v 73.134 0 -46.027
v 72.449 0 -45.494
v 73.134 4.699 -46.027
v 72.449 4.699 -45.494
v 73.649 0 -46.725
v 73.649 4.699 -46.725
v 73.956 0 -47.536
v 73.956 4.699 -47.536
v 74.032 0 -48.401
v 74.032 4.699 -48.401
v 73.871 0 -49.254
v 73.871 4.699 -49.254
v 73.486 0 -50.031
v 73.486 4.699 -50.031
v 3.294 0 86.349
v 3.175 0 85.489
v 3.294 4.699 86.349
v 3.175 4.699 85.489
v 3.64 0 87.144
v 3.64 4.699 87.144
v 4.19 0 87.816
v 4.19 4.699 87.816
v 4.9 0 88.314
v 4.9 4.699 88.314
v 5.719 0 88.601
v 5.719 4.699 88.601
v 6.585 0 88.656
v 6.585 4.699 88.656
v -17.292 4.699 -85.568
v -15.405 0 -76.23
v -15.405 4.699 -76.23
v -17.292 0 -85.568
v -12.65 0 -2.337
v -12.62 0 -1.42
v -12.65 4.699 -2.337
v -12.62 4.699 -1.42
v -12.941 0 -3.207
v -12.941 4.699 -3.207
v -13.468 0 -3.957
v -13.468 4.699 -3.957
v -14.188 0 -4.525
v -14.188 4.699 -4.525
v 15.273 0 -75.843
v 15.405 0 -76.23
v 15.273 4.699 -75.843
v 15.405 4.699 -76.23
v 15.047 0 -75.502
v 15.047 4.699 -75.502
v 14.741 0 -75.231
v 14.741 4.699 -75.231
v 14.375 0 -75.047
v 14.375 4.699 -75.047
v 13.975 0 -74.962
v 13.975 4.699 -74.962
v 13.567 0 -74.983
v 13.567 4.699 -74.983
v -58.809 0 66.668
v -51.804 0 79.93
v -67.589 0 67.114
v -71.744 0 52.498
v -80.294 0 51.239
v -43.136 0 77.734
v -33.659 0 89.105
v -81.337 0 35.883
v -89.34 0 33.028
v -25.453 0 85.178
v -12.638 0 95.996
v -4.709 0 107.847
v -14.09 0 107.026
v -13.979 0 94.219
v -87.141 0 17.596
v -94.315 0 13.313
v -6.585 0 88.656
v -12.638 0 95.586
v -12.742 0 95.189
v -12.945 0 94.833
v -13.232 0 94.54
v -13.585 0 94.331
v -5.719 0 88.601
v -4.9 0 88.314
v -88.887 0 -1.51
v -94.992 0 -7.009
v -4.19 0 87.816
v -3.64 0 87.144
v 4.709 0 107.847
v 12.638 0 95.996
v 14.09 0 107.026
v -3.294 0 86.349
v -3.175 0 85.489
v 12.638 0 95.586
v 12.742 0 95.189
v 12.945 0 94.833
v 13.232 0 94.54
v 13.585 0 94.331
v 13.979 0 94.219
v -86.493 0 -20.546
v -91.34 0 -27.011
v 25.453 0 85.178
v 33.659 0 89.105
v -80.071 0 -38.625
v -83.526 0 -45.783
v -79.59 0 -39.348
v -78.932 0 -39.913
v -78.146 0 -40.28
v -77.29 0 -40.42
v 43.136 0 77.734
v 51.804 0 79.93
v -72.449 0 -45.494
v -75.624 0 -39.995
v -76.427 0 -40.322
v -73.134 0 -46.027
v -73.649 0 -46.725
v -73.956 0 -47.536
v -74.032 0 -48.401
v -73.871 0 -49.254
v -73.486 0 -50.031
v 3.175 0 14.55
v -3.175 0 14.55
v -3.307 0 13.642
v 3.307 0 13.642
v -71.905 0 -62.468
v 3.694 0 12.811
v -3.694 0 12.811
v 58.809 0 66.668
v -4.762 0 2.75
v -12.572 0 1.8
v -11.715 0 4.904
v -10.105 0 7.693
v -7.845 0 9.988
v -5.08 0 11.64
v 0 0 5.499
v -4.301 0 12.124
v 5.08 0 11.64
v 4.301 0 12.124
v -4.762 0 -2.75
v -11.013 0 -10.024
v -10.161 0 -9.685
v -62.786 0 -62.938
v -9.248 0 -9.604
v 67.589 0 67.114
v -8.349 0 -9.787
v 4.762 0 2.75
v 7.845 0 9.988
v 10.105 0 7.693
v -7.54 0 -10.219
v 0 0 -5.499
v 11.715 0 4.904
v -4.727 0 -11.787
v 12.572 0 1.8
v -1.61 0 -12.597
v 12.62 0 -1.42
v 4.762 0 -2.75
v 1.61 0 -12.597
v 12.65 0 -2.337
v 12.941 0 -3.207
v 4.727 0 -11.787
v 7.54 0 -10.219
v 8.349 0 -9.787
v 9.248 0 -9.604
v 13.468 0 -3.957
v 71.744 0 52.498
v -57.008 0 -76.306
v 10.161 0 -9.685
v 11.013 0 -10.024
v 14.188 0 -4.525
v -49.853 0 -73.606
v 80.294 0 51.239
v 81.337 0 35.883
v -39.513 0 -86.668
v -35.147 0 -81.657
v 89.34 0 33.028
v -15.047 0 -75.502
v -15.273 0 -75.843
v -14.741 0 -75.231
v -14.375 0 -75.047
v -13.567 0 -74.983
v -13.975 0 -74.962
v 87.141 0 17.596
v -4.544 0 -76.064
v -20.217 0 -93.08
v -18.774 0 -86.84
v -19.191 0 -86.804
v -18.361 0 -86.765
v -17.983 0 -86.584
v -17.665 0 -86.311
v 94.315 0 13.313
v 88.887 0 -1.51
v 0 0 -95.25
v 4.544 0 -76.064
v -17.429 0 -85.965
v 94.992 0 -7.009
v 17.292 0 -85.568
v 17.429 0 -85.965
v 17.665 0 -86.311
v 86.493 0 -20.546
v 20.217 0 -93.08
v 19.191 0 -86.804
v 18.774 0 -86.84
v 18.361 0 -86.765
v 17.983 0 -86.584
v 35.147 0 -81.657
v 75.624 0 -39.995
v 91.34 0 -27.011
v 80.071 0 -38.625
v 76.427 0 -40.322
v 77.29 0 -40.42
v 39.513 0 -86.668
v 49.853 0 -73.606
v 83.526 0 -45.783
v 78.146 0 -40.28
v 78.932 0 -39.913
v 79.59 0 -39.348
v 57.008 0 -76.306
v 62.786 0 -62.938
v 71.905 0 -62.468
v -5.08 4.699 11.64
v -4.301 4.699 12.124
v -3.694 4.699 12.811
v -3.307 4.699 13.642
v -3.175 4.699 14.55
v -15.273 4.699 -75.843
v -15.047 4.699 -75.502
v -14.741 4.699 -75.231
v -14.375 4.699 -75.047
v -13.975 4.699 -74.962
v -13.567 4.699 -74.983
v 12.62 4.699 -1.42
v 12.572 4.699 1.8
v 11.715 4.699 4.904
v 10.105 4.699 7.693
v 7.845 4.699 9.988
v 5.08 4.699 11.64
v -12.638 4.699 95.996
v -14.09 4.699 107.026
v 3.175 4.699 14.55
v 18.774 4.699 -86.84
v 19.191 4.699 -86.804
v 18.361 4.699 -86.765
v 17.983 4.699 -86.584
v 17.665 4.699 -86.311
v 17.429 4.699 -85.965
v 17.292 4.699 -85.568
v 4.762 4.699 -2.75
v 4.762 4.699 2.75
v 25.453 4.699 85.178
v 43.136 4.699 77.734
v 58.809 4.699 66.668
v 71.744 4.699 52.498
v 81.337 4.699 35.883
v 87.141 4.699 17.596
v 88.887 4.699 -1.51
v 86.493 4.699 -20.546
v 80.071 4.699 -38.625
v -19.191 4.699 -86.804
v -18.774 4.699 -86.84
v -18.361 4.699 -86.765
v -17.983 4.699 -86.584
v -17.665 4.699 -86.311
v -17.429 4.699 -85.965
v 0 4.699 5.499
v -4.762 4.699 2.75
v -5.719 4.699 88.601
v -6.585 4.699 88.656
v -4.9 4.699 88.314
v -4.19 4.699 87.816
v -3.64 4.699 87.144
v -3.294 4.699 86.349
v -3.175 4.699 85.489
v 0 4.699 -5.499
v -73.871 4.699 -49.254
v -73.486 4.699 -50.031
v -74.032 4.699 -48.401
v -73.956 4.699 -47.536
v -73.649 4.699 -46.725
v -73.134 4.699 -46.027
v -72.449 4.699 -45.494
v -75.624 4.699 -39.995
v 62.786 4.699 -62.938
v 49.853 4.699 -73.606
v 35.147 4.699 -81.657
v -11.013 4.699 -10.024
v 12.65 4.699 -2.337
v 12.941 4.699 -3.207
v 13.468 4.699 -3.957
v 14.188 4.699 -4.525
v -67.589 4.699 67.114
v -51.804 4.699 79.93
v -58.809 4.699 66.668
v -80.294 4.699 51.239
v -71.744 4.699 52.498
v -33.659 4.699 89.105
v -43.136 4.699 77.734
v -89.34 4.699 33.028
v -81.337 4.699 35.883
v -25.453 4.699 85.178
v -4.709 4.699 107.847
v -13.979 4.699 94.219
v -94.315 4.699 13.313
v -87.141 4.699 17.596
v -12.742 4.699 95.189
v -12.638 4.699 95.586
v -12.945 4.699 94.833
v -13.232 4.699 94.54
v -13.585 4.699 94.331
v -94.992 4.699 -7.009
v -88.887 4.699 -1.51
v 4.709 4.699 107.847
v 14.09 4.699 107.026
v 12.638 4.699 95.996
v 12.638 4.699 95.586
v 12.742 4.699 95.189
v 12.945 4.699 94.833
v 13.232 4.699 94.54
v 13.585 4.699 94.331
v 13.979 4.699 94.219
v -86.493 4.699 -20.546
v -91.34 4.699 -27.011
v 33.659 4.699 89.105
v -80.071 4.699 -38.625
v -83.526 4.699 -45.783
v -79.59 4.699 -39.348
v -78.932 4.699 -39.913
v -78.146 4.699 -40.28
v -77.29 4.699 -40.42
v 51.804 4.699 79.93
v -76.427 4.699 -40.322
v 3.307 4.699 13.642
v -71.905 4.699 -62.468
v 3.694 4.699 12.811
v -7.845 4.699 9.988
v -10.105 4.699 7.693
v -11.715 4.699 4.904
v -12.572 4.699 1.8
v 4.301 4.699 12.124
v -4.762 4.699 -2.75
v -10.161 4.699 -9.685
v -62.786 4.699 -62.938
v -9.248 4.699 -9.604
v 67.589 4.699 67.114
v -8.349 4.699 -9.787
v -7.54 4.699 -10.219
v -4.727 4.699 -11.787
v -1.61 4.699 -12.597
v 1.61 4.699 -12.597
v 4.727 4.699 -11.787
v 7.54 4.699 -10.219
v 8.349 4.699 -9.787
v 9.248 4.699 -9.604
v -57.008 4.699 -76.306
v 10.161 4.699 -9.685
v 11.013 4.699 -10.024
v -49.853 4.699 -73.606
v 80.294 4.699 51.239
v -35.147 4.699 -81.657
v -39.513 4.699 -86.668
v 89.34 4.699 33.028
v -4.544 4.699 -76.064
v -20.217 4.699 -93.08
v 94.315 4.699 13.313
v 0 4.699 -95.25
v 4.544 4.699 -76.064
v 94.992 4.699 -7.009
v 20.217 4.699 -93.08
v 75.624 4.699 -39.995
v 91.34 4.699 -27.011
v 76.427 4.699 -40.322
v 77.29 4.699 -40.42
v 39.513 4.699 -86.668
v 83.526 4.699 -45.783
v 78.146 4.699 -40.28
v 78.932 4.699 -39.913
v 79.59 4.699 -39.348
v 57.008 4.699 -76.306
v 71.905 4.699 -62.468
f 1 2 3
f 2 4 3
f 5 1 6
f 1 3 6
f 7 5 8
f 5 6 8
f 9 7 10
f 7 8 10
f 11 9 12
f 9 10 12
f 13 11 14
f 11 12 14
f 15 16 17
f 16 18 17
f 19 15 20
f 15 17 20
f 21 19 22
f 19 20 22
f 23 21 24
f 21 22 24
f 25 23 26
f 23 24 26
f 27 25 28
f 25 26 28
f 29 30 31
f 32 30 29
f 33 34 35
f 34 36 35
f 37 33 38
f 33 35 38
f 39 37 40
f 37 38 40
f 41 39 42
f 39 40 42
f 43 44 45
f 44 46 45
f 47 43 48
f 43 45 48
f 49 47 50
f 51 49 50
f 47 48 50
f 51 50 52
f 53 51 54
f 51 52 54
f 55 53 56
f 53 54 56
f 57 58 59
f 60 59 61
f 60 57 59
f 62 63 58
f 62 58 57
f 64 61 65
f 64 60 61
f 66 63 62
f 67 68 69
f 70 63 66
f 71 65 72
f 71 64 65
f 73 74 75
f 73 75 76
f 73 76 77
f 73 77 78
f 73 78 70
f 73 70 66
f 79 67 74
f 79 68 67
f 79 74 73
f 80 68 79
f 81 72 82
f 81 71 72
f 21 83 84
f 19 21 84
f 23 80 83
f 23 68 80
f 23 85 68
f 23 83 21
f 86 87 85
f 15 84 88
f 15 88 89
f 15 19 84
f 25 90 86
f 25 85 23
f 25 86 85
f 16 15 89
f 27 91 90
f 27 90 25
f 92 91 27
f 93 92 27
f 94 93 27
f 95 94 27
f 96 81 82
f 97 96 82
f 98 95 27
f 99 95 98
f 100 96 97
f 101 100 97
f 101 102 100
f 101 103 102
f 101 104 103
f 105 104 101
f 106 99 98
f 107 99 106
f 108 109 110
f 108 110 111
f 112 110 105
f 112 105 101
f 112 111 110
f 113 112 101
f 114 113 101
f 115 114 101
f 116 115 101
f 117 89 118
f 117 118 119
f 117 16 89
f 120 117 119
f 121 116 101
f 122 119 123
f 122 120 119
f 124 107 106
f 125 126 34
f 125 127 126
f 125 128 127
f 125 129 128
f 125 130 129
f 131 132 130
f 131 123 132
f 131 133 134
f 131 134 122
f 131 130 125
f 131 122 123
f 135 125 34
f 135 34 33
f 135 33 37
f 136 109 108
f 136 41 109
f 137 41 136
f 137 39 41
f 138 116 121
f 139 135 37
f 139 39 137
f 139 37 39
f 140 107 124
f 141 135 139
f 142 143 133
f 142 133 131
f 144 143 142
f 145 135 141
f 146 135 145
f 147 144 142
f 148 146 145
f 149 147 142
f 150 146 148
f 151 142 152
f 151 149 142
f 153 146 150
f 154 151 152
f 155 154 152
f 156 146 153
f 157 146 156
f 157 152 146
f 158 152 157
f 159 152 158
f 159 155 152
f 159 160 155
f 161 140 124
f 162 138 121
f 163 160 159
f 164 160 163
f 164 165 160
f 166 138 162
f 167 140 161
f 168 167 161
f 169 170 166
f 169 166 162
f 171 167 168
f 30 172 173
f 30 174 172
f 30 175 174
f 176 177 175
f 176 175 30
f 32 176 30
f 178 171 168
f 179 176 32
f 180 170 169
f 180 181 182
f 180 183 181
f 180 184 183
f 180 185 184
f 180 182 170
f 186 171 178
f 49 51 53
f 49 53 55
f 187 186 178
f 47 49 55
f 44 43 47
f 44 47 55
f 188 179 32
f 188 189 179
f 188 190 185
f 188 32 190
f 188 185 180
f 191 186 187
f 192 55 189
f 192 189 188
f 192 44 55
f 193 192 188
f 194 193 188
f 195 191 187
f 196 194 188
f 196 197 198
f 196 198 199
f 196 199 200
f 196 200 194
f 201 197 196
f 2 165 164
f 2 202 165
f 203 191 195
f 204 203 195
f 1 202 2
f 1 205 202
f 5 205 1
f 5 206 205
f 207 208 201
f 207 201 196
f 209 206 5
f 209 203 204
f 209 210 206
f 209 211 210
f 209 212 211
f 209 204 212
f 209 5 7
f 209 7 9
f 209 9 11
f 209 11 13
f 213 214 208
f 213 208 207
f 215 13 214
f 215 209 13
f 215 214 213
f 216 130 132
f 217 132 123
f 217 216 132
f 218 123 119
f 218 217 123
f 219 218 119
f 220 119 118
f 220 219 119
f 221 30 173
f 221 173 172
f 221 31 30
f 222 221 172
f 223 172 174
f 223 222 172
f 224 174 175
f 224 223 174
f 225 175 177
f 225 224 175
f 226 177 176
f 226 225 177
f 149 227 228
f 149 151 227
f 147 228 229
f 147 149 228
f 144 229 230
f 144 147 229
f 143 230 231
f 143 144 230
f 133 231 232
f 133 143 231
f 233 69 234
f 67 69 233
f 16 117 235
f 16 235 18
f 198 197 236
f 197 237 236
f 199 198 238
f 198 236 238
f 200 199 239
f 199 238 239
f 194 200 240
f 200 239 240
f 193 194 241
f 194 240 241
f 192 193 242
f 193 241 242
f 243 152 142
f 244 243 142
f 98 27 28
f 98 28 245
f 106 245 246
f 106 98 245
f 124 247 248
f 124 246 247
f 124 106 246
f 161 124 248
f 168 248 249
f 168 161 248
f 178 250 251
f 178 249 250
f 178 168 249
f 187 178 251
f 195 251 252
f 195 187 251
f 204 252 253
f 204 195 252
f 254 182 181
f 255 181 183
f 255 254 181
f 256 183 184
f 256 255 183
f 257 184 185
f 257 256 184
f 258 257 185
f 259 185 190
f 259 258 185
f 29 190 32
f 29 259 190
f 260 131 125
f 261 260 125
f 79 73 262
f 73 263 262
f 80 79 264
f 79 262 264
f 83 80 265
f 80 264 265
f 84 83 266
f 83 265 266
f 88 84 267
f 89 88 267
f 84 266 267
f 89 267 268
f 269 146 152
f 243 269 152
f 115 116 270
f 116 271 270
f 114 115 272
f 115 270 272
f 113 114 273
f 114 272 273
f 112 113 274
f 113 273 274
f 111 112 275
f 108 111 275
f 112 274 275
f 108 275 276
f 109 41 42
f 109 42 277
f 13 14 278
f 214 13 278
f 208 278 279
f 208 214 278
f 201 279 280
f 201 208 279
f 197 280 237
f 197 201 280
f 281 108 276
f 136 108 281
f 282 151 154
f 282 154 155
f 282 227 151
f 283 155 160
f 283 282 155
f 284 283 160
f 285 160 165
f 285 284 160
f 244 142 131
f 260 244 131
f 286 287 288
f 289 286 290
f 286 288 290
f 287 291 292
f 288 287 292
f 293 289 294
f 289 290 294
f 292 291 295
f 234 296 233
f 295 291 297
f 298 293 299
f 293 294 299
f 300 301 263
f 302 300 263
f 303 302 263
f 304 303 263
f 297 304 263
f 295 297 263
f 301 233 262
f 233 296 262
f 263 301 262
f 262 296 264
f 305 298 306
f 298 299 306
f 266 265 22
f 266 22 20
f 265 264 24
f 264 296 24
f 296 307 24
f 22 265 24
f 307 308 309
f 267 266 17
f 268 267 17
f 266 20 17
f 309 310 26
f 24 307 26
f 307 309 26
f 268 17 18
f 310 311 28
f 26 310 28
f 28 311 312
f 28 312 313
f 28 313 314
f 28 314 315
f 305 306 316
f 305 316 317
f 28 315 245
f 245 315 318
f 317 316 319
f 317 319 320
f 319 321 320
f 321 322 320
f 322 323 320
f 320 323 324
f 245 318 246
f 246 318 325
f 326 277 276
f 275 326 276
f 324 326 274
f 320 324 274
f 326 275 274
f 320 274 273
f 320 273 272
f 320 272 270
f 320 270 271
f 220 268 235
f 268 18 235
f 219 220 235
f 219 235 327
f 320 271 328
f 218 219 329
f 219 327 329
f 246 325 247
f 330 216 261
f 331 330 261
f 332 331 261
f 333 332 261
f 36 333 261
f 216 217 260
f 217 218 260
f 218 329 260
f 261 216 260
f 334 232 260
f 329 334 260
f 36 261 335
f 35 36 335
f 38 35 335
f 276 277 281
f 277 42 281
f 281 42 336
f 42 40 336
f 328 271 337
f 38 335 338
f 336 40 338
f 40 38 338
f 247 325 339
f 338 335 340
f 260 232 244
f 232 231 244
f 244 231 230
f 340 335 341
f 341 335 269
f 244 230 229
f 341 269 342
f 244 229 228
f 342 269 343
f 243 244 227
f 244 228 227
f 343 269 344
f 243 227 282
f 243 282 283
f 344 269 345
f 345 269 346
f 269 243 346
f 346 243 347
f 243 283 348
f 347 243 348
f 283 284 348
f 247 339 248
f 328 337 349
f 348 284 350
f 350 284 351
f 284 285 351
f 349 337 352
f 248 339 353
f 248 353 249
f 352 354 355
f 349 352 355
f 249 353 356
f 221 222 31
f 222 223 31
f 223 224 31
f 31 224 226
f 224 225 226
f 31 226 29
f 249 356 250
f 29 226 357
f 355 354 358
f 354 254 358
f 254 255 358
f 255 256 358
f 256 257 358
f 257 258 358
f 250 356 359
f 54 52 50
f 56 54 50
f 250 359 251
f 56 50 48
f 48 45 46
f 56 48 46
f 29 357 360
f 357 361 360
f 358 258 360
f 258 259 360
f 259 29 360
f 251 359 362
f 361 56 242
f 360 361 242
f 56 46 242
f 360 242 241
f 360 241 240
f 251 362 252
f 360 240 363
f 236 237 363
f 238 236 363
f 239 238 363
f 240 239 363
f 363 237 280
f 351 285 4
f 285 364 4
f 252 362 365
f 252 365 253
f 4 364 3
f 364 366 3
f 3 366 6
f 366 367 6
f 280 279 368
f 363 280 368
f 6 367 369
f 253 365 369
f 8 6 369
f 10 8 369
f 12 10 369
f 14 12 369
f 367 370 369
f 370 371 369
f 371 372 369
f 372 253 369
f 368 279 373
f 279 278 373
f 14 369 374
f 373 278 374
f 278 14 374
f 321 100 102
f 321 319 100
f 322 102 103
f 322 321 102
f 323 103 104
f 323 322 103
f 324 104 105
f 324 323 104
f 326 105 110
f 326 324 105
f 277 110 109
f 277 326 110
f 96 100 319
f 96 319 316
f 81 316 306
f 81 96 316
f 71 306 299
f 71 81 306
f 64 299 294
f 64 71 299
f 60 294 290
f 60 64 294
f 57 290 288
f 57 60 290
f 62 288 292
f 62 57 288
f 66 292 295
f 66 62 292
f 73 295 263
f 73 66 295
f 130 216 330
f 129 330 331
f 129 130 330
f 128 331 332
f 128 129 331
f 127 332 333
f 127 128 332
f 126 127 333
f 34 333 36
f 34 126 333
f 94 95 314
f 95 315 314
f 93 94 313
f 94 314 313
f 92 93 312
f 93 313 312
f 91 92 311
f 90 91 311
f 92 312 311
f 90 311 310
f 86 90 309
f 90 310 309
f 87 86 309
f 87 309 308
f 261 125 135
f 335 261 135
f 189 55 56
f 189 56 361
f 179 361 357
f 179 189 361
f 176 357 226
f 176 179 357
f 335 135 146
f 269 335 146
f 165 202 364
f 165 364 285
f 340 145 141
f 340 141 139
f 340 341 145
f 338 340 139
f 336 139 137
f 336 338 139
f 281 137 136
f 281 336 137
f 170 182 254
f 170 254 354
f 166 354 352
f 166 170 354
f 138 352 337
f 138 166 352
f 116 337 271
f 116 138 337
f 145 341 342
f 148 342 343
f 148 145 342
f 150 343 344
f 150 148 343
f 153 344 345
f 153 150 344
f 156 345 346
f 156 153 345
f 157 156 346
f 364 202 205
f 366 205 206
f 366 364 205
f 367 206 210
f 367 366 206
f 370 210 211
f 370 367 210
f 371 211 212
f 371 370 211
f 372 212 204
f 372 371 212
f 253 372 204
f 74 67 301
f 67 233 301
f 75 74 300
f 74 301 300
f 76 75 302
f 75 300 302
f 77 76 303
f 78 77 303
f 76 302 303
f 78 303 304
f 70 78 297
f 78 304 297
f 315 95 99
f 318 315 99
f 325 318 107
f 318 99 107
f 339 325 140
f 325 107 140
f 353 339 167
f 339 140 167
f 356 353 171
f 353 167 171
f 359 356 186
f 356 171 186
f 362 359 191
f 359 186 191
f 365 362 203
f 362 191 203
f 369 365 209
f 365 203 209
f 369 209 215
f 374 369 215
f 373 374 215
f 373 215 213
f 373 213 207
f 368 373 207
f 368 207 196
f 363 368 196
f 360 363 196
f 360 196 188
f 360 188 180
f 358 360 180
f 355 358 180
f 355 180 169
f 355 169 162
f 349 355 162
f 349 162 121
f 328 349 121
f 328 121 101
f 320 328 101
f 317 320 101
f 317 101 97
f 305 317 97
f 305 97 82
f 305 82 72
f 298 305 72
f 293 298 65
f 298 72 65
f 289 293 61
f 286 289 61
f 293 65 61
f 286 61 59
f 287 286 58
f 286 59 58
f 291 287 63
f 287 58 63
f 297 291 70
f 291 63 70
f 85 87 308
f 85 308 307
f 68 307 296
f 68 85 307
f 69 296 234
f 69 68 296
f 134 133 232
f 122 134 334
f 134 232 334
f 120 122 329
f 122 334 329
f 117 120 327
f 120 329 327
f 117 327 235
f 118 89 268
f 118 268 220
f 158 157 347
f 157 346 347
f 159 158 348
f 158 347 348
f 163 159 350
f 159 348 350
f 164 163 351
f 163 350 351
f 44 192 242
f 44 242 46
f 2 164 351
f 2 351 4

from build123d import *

# Parameters (mm, degrees)
SKETCH1_R                = 95.25
SKETCH1_R_2              = 88.9
BOSS_EXTRUDE1_DEPTH      = 4.699
BOSS_EXTRUDE2_DEPTH      = 4.699
SKETCH3_R                = 12.7
BOSS_EXTRUDE3_DEPTH      = 4.699
BOSS_EXTRUDE4_DEPTH      = 4.699
FILLET1_R                = 3.175
CIRPATTERN1_COUNT        = 3
FILLET1_OF_CIRPATTERN1_R = 3.175
FILLET2_R                = 1.5875


with BuildPart() as part:
    # Sketch1 → Boss-Extrude1 (new body)
    with BuildSketch(Plane(origin=(0, 0, 0), x_dir=(1, 0, 0), z_dir=(0, 1, 0))):
        with Locations(Location((0, 0, 0), (0, 0, 270))):
            Circle(SKETCH1_R)
        with Locations(Location((0, 0, 0), (0, 0, 270))):
            Circle(SKETCH1_R_2, mode=Mode.SUBTRACT)
    extrude(amount=BOSS_EXTRUDE1_DEPTH)

    # Sketch2 → Boss-Extrude2 (add)
    with BuildSketch(Plane.XZ):
        with BuildLine():
            ThreePointArc((14.09030245, 107.026472785), (0, 107.95), (-14.09030245, 107.026472785))
            Line((-14.09030245, 107.026472785), (-12.432619809, 94.435123046))
            ThreePointArc((-12.432619809, 94.435123046), (0, 95.25), (12.432619809, 94.435123046))
            Line((12.432619809, 94.435123046), (14.09030245, 107.026472785))
        make_face()
        with BuildLine():
            Line((-15.09408047, -74.690084581), (-17.609760548, -87.138432012))
            ThreePointArc((-17.609760548, -87.138432012), (0, -88.9), (17.609760548, -87.138432012))
            Line((17.609760548, -87.138432012), (15.09408047, -74.690084581))
            ThreePointArc((15.09408047, -74.690084581), (0, -76.2), (-15.09408047, -74.690084581))
        make_face()
    extrude(amount=-BOSS_EXTRUDE2_DEPTH)



with BuildPart() as body_2:
    # Sketch3 → Boss-Extrude3 (new body)
    with BuildSketch(Plane.XZ):
        with Locations(Location((0, 0, 0), (0, 0, 270))):
            Circle(SKETCH3_R)
        Polygon((0, 5.499261314), (-4.7625, 2.749630657), (-4.7625, -2.749630657), (0, -5.499261314), (4.7625, -2.749630657), (4.7625, 2.749630657), align=None, mode=Mode.SUBTRACT)
    extrude(amount=-BOSS_EXTRUDE3_DEPTH)


with BuildPart() as part_1:
    add(part.part)

    add(body_2.part)  # Boss-Extrude4 merges body 2
    # Sketch4 → Boss-Extrude4 (add)
    with BuildSketch(Plane(origin=(0, 0, 0), x_dir=(-1, 0, 0), z_dir=(0, -1, 0))):
        with BuildLine():
            Line((3.175, -88.843285481), (3.175, -12.296722124))
            ThreePointArc((3.175, -12.296722124), (0, -12.7), (-3.175, -12.296722124))
            Line((-3.175, -12.296722124), (-3.175, -88.843285481))
            ThreePointArc((-3.175, -88.843285481), (0, -88.9), (3.175, -88.843285481))
        make_face()
    boss_extrude4 = extrude(amount=-BOSS_EXTRUDE4_DEPTH)

    # Fillet1
    fillet1_edges = [part_1.edges().sort_by_distance(p)[0] for p in [
        (-3.175, 2.3495, 12.296722124),
        (3.175, 2.3495, 12.296722124),
        (3.175, 2.3495, 88.843285481),
        (-3.175, 2.3495, 88.843285481),
    ]]
    fillet(fillet1_edges, radius=FILLET1_R)

    # CirPattern1: Boss-Extrude4 ×3 about axis
    cirpattern1_axis = Axis((0, 0, 0), (0, 1, 0))
    for i in range(1, CIRPATTERN1_COUNT):
        add(boss_extrude4.rotate(cirpattern1_axis, i * 360 / CIRPATTERN1_COUNT))

    # Fillet1 of CirPattern1
    fillet1_of_cirpattern1_edges = [part_1.edges().sort_by_distance(p)[0] for p in [
        (12.236773743, 2.3495, -3.398730405),
        (9.061773743, 2.3495, -8.897991719),
        (75.353042182, 2.3495, -47.171273397),
        (78.528042182, 2.3495, -41.672012083),
        (-9.061773743, 2.3495, -8.897991719),
        (-12.236773743, 2.3495, -3.398730405),
        (-78.528042182, 2.3495, -41.672012083),
        (-75.353042182, 2.3495, -47.171273397),
    ]]
    fillet(fillet1_of_cirpattern1_edges, radius=FILLET1_OF_CIRPATTERN1_R)

    # Fillet2
    fillet2_edges = [part_1.edges().sort_by_distance(p)[0] for p in [
        (-15.09408047, 2.3495, -74.690084581),
        (15.09408047, 2.3495, -74.690084581),
        (17.609760548, 2.3495, -87.138432012),
        (-17.609760548, 2.3495, -87.138432012),
        (-12.432619809, 2.3495, 94.435123046),
        (12.432619809, 2.3495, 94.435123046),
    ]]
    fillet(fillet2_edges, radius=FILLET2_R)


solid = part_1.part
